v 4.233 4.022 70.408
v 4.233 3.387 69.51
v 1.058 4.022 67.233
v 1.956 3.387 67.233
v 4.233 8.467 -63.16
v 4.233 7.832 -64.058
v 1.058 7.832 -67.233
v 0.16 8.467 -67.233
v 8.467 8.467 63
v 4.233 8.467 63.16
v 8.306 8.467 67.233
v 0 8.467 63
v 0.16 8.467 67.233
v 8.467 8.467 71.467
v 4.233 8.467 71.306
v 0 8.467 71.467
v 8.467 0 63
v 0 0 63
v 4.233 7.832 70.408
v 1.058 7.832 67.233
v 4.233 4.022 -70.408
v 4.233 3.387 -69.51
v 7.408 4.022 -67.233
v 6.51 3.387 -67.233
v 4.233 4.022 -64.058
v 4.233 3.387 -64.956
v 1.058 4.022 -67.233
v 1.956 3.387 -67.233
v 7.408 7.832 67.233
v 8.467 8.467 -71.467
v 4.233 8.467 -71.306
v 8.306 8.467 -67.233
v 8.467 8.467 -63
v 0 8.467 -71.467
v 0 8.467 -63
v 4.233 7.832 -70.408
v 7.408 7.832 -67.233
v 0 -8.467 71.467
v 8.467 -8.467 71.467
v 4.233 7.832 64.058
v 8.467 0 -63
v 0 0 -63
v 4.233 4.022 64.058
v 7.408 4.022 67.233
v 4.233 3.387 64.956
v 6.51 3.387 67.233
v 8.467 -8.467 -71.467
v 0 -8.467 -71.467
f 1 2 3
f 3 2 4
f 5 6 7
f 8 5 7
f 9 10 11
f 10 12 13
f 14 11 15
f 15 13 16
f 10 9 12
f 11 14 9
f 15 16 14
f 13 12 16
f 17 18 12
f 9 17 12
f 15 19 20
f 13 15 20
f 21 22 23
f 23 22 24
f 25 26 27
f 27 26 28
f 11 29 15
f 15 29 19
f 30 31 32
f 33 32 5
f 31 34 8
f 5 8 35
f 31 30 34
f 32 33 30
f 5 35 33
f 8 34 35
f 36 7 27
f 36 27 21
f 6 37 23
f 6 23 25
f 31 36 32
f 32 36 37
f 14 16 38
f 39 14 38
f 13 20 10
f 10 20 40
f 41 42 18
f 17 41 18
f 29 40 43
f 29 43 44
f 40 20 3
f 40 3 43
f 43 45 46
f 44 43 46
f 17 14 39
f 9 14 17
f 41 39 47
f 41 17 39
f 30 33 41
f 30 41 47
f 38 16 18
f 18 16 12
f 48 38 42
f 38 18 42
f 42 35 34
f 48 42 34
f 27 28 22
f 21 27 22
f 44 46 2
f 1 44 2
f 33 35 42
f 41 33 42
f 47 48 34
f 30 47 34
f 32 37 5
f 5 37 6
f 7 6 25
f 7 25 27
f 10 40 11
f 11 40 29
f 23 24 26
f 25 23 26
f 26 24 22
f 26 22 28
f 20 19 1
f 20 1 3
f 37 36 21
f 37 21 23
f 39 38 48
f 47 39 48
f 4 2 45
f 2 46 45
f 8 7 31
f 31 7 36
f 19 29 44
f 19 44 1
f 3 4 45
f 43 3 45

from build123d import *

# Parameters (mm, degrees)
BOSS_EXTRUDE1_DEPTH = 8.466666667
CUT_EXTRUDE1_DEPTH  = 5.08
CHAMFER1_SIZE       = 0.635


with BuildPart() as part:
    # Sketch1 → Boss-Extrude1 (new body)
    with BuildSketch(Plane(origin=(0, 0, 0), x_dir=(0, 0, -1), z_dir=(1, 0, 0))):
        Polygon((-71.466673, 8.466666667), (-71.466673, -8.466666667), (71.466673, -8.466666667), (71.466673, 8.466666667), (63.000006333, 8.466666667), (63.000006333, 0), (-63.000006333, 0), (-63.000006333, 8.466666667), align=None)
    extrude(amount=BOSS_EXTRUDE1_DEPTH)

    # Sketch2 → Cut-Extrude1 (cut)
    with BuildSketch(Plane(origin=(0, 8.466666667, 0), x_dir=(1, 0, 0), z_dir=(0, 1, 0))):
        Polygon((1.058333333, -67.233339667), (4.233333333, -64.058339667), (7.408333333, -67.233339667), (4.233333333, -70.408339667), align=None)
        Polygon((1.058333333, 67.233339667), (4.233333333, 70.408339667), (7.408333333, 67.233339667), (4.233333333, 64.058339667), align=None)
    extrude(amount=-CUT_EXTRUDE1_DEPTH, mode=Mode.SUBTRACT)

    # Chamfer1
    chamfer1_edges = [part.edges().sort_by_distance(p)[0] for p in [
        (2.645833333, 3.386666667, 68.820839667),
        (2.645833333, 3.386666667, 65.645839667),
        (5.820833333, 3.386666667, 65.645839667),
        (5.820833333, 3.386666667, 68.820839667),
        (2.645833333, 8.466666667, 68.820839667),
        (5.820833333, 8.466666667, 68.820839667),
        (5.820833333, 8.466666667, 65.645839667),
        (2.645833333, 8.466666667, 65.645839667),
        (2.645833333, 3.386666667, -65.645839667),
        (2.645833333, 3.386666667, -68.820839667),
        (5.820833333, 3.386666667, -68.820839667),
        (5.820833333, 3.386666667, -65.645839667),
        (2.645833333, 8.466666667, -65.645839667),
        (5.820833333, 8.466666667, -65.645839667),
        (5.820833333, 8.466666667, -68.820839667),
        (2.645833333, 8.466666667, -68.820839667),
    ]]
    chamfer(chamfer1_edges, length=CHAMFER1_SIZE)


solid = part.part
